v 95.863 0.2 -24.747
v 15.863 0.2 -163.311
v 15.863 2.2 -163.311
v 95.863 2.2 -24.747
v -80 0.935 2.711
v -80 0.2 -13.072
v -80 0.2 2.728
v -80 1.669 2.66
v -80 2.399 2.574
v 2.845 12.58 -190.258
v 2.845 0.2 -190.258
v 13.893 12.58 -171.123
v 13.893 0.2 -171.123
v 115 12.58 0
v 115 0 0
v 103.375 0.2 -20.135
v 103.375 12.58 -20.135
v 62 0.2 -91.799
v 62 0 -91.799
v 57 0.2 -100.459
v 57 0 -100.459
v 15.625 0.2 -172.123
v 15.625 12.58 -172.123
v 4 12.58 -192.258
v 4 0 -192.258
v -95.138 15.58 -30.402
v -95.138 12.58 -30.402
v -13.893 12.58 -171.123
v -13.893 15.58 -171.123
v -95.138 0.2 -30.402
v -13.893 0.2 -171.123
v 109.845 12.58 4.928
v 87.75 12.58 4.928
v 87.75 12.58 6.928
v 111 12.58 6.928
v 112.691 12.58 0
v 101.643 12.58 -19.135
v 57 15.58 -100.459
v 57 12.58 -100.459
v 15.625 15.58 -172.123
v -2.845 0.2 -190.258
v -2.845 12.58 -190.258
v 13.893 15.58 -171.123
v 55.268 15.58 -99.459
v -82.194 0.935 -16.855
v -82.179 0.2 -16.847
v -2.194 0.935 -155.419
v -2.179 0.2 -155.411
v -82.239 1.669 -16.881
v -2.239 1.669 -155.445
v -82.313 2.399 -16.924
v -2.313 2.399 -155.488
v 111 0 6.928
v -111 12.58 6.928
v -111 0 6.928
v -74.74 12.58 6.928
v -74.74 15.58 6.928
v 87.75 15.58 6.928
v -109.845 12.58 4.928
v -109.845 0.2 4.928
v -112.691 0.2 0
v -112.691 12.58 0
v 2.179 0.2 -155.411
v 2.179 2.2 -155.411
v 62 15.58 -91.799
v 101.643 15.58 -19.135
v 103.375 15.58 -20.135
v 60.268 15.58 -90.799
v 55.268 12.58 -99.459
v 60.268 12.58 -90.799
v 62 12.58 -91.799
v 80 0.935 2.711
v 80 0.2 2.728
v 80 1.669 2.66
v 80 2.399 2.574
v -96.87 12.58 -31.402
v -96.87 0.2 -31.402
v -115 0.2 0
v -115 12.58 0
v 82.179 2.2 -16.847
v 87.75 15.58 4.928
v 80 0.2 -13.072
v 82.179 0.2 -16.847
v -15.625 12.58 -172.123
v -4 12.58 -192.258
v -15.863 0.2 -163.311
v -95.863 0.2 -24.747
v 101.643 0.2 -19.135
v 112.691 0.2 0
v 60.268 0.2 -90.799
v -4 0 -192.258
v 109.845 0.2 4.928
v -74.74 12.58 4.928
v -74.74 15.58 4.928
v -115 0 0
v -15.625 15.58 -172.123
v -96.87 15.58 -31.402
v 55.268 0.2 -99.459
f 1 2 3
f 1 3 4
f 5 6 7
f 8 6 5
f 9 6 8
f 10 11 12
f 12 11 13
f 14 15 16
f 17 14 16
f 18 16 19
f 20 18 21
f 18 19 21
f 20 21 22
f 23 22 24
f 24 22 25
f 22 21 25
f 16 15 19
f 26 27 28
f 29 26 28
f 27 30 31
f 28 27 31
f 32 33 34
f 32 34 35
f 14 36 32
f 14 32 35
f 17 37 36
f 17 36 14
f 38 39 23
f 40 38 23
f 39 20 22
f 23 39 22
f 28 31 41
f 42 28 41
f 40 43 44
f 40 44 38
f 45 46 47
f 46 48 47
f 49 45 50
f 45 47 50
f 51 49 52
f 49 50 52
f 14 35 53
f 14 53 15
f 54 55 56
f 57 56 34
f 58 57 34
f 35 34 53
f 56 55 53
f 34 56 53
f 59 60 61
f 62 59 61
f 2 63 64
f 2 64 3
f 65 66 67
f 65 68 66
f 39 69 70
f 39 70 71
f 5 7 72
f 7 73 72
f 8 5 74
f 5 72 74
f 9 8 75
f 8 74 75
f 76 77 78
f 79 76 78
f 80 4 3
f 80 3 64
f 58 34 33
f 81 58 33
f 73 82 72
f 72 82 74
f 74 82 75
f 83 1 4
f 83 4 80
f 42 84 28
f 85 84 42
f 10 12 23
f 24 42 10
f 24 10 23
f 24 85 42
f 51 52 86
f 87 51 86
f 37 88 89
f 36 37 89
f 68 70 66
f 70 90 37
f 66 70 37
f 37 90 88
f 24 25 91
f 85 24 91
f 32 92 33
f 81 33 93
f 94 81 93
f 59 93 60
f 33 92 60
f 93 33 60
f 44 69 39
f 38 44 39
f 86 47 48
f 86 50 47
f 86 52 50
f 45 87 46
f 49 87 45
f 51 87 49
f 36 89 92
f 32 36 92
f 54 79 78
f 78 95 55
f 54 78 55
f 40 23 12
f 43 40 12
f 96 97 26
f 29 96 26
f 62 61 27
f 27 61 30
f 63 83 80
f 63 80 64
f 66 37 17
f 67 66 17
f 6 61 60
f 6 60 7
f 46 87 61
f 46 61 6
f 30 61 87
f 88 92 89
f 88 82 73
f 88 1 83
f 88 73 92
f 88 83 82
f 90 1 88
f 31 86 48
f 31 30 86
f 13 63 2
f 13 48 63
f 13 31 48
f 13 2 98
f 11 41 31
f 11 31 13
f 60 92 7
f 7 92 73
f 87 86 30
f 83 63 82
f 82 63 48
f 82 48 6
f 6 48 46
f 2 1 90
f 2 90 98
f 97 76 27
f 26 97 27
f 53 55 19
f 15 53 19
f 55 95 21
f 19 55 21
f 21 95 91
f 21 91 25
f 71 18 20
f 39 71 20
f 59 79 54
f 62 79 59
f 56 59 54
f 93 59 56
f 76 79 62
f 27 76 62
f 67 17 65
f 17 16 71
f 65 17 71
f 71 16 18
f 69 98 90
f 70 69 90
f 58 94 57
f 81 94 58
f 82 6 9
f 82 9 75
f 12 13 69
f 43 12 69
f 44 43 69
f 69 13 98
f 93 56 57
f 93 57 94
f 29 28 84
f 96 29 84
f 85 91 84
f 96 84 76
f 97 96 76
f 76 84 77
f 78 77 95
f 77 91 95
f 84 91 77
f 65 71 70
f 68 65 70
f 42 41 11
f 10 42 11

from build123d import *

# Parameters (mm, degrees)
BOSS_EXTRUDE1_DEPTH = 0.2
BOSS_EXTRUDE2_DEPTH = 12.58
SKETCH1_4_W         = 162.49
SKETCH1_4_H         = 2
BOSS_EXTRUDE3_DEPTH = 15.58
BOSS_EXTRUDE5_DEPTH = 2
SKETCH3_7_W         = 160
SKETCH3_7_H         = 15.8
REVOLVE3_ANGLE      = 8
REVOLVE4_ANGLE      = 8


# Read off the part's stored shape, not the designer's step: Boss-Extrude2
with BuildPart() as part:
    # Sketch1 → Boss-Extrude1 (new body)
    with BuildSketch(Plane(origin=(0, 0, 0), x_dir=(1, 0, 0), z_dir=(0, 1, 0))):
        Polygon((-115, 0), (-111, -6.92820323), (111, -6.92820323), (115, 0), (15.625, 172.122549002), (13.892949192, 171.122549002), (2.845299462, 190.25763964), (-2.845299462, 190.25763964), (-13.892949192, 171.122549002), (-15.625, 172.122549002), align=None)
    extrude(amount=BOSS_EXTRUDE1_DEPTH)

    # Boss-Extrude2 outline → Boss-Extrude2 (add)
    with BuildSketch(Plane(origin=(0, 0, 0), x_dir=(1, 0, 0), z_dir=(0, 1, 0))):
        Polygon((15.625, 172.122549002), (4, 192.25763964), (-4, 192.25763964), (-15.625, 172.122549002), (-13.892949192, 171.122549002), (-2.845299462, 190.25763964), (2.845299462, 190.25763964), (13.892949192, 171.122549002), align=None)
        Polygon((62, 91.798692801), (57, 100.458946839), (55.267949192, 99.458946839), (60.267949192, 90.798692801), align=None)
        Polygon((-95.137949192, 30.402081141), (-96.87, 31.402081141), (-115, 0), (-111, -6.92820323), (-74.74, -6.92820323), (-74.74, -4.92820323), (-109.845299462, -4.92820323), (-112.690598923, 0), align=None)
        Polygon((115, 0), (103.375, 20.135090638), (101.642949192, 19.135090638), (112.690598923, 0), (109.845299462, -4.92820323), (87.75, -4.92820323), (87.75, -6.92820323), (111, -6.92820323), align=None)
    extrude(amount=BOSS_EXTRUDE2_DEPTH)

    # Sketch1<4> → Boss-Extrude3 (add)
    with BuildSketch(Plane(origin=(0, 0, 0), x_dir=(1, 0, 0), z_dir=(0, 1, 0))):
        Polygon((-15.625, 172.122549002), (-96.87, 31.402081141), (-95.137949192, 30.402081141), (-13.892949192, 171.122549002), align=None)
        with Locations((6.505, -5.92820323)):
            Rectangle(SKETCH1_4_W, SKETCH1_4_H)
        Polygon((57, 100.458946839), (15.625, 172.122549002), (13.892949192, 171.122549002), (55.267949192, 99.458946839), align=None)
        Polygon((101.642949192, 19.135090638), (103.375, 20.135090638), (62, 91.798692801), (60.267949192, 90.798692801), align=None)
    extrude(amount=BOSS_EXTRUDE3_DEPTH)

    # Sketch3 → Boss-Extrude5 (add)
    with BuildSketch(Plane(origin=(0, 0.2, 0), x_dir=(1, 0, 0), z_dir=(0, 1, 0))):
        Polygon((2.179491924, 155.410852123), (15.862693304, 163.310852123), (95.862693304, 24.746787517), (82.179491924, 16.846787517), align=None)
    extrude(amount=BOSS_EXTRUDE5_DEPTH)

    # Sketch3<7> → Revolve3 (revolve)
    with BuildSketch(Plane(origin=(0, 0.2, 0), x_dir=(1, 0, 0), z_dir=(0, 1, 0))):
        with Locations((0, 5.17179677)):
            Rectangle(SKETCH3_7_W, SKETCH3_7_H)
    revolve(axis=Axis((80, 0.2, -13.07179677), (-1, 0, 0)), revolution_arc=REVOLVE3_ANGLE)

    # Sketch3<8> → Revolve4 (revolve)
    with BuildSketch(Plane(origin=(0, 0.2, 0), x_dir=(1, 0, 0), z_dir=(0, 1, 0))):
        Polygon((-15.862693304, 163.310852123), (-2.179491924, 155.410852123), (-42.179491924, 86.12881982), (-82.179491924, 16.846787517), (-95.862693304, 24.746787517), align=None)
    revolve(axis=Axis((-95.862693304, 0.2, -24.746787517), (-0.500000000000001, 0, 0.866025403784438)), revolution_arc=REVOLVE4_ANGLE)


solid = part.part
